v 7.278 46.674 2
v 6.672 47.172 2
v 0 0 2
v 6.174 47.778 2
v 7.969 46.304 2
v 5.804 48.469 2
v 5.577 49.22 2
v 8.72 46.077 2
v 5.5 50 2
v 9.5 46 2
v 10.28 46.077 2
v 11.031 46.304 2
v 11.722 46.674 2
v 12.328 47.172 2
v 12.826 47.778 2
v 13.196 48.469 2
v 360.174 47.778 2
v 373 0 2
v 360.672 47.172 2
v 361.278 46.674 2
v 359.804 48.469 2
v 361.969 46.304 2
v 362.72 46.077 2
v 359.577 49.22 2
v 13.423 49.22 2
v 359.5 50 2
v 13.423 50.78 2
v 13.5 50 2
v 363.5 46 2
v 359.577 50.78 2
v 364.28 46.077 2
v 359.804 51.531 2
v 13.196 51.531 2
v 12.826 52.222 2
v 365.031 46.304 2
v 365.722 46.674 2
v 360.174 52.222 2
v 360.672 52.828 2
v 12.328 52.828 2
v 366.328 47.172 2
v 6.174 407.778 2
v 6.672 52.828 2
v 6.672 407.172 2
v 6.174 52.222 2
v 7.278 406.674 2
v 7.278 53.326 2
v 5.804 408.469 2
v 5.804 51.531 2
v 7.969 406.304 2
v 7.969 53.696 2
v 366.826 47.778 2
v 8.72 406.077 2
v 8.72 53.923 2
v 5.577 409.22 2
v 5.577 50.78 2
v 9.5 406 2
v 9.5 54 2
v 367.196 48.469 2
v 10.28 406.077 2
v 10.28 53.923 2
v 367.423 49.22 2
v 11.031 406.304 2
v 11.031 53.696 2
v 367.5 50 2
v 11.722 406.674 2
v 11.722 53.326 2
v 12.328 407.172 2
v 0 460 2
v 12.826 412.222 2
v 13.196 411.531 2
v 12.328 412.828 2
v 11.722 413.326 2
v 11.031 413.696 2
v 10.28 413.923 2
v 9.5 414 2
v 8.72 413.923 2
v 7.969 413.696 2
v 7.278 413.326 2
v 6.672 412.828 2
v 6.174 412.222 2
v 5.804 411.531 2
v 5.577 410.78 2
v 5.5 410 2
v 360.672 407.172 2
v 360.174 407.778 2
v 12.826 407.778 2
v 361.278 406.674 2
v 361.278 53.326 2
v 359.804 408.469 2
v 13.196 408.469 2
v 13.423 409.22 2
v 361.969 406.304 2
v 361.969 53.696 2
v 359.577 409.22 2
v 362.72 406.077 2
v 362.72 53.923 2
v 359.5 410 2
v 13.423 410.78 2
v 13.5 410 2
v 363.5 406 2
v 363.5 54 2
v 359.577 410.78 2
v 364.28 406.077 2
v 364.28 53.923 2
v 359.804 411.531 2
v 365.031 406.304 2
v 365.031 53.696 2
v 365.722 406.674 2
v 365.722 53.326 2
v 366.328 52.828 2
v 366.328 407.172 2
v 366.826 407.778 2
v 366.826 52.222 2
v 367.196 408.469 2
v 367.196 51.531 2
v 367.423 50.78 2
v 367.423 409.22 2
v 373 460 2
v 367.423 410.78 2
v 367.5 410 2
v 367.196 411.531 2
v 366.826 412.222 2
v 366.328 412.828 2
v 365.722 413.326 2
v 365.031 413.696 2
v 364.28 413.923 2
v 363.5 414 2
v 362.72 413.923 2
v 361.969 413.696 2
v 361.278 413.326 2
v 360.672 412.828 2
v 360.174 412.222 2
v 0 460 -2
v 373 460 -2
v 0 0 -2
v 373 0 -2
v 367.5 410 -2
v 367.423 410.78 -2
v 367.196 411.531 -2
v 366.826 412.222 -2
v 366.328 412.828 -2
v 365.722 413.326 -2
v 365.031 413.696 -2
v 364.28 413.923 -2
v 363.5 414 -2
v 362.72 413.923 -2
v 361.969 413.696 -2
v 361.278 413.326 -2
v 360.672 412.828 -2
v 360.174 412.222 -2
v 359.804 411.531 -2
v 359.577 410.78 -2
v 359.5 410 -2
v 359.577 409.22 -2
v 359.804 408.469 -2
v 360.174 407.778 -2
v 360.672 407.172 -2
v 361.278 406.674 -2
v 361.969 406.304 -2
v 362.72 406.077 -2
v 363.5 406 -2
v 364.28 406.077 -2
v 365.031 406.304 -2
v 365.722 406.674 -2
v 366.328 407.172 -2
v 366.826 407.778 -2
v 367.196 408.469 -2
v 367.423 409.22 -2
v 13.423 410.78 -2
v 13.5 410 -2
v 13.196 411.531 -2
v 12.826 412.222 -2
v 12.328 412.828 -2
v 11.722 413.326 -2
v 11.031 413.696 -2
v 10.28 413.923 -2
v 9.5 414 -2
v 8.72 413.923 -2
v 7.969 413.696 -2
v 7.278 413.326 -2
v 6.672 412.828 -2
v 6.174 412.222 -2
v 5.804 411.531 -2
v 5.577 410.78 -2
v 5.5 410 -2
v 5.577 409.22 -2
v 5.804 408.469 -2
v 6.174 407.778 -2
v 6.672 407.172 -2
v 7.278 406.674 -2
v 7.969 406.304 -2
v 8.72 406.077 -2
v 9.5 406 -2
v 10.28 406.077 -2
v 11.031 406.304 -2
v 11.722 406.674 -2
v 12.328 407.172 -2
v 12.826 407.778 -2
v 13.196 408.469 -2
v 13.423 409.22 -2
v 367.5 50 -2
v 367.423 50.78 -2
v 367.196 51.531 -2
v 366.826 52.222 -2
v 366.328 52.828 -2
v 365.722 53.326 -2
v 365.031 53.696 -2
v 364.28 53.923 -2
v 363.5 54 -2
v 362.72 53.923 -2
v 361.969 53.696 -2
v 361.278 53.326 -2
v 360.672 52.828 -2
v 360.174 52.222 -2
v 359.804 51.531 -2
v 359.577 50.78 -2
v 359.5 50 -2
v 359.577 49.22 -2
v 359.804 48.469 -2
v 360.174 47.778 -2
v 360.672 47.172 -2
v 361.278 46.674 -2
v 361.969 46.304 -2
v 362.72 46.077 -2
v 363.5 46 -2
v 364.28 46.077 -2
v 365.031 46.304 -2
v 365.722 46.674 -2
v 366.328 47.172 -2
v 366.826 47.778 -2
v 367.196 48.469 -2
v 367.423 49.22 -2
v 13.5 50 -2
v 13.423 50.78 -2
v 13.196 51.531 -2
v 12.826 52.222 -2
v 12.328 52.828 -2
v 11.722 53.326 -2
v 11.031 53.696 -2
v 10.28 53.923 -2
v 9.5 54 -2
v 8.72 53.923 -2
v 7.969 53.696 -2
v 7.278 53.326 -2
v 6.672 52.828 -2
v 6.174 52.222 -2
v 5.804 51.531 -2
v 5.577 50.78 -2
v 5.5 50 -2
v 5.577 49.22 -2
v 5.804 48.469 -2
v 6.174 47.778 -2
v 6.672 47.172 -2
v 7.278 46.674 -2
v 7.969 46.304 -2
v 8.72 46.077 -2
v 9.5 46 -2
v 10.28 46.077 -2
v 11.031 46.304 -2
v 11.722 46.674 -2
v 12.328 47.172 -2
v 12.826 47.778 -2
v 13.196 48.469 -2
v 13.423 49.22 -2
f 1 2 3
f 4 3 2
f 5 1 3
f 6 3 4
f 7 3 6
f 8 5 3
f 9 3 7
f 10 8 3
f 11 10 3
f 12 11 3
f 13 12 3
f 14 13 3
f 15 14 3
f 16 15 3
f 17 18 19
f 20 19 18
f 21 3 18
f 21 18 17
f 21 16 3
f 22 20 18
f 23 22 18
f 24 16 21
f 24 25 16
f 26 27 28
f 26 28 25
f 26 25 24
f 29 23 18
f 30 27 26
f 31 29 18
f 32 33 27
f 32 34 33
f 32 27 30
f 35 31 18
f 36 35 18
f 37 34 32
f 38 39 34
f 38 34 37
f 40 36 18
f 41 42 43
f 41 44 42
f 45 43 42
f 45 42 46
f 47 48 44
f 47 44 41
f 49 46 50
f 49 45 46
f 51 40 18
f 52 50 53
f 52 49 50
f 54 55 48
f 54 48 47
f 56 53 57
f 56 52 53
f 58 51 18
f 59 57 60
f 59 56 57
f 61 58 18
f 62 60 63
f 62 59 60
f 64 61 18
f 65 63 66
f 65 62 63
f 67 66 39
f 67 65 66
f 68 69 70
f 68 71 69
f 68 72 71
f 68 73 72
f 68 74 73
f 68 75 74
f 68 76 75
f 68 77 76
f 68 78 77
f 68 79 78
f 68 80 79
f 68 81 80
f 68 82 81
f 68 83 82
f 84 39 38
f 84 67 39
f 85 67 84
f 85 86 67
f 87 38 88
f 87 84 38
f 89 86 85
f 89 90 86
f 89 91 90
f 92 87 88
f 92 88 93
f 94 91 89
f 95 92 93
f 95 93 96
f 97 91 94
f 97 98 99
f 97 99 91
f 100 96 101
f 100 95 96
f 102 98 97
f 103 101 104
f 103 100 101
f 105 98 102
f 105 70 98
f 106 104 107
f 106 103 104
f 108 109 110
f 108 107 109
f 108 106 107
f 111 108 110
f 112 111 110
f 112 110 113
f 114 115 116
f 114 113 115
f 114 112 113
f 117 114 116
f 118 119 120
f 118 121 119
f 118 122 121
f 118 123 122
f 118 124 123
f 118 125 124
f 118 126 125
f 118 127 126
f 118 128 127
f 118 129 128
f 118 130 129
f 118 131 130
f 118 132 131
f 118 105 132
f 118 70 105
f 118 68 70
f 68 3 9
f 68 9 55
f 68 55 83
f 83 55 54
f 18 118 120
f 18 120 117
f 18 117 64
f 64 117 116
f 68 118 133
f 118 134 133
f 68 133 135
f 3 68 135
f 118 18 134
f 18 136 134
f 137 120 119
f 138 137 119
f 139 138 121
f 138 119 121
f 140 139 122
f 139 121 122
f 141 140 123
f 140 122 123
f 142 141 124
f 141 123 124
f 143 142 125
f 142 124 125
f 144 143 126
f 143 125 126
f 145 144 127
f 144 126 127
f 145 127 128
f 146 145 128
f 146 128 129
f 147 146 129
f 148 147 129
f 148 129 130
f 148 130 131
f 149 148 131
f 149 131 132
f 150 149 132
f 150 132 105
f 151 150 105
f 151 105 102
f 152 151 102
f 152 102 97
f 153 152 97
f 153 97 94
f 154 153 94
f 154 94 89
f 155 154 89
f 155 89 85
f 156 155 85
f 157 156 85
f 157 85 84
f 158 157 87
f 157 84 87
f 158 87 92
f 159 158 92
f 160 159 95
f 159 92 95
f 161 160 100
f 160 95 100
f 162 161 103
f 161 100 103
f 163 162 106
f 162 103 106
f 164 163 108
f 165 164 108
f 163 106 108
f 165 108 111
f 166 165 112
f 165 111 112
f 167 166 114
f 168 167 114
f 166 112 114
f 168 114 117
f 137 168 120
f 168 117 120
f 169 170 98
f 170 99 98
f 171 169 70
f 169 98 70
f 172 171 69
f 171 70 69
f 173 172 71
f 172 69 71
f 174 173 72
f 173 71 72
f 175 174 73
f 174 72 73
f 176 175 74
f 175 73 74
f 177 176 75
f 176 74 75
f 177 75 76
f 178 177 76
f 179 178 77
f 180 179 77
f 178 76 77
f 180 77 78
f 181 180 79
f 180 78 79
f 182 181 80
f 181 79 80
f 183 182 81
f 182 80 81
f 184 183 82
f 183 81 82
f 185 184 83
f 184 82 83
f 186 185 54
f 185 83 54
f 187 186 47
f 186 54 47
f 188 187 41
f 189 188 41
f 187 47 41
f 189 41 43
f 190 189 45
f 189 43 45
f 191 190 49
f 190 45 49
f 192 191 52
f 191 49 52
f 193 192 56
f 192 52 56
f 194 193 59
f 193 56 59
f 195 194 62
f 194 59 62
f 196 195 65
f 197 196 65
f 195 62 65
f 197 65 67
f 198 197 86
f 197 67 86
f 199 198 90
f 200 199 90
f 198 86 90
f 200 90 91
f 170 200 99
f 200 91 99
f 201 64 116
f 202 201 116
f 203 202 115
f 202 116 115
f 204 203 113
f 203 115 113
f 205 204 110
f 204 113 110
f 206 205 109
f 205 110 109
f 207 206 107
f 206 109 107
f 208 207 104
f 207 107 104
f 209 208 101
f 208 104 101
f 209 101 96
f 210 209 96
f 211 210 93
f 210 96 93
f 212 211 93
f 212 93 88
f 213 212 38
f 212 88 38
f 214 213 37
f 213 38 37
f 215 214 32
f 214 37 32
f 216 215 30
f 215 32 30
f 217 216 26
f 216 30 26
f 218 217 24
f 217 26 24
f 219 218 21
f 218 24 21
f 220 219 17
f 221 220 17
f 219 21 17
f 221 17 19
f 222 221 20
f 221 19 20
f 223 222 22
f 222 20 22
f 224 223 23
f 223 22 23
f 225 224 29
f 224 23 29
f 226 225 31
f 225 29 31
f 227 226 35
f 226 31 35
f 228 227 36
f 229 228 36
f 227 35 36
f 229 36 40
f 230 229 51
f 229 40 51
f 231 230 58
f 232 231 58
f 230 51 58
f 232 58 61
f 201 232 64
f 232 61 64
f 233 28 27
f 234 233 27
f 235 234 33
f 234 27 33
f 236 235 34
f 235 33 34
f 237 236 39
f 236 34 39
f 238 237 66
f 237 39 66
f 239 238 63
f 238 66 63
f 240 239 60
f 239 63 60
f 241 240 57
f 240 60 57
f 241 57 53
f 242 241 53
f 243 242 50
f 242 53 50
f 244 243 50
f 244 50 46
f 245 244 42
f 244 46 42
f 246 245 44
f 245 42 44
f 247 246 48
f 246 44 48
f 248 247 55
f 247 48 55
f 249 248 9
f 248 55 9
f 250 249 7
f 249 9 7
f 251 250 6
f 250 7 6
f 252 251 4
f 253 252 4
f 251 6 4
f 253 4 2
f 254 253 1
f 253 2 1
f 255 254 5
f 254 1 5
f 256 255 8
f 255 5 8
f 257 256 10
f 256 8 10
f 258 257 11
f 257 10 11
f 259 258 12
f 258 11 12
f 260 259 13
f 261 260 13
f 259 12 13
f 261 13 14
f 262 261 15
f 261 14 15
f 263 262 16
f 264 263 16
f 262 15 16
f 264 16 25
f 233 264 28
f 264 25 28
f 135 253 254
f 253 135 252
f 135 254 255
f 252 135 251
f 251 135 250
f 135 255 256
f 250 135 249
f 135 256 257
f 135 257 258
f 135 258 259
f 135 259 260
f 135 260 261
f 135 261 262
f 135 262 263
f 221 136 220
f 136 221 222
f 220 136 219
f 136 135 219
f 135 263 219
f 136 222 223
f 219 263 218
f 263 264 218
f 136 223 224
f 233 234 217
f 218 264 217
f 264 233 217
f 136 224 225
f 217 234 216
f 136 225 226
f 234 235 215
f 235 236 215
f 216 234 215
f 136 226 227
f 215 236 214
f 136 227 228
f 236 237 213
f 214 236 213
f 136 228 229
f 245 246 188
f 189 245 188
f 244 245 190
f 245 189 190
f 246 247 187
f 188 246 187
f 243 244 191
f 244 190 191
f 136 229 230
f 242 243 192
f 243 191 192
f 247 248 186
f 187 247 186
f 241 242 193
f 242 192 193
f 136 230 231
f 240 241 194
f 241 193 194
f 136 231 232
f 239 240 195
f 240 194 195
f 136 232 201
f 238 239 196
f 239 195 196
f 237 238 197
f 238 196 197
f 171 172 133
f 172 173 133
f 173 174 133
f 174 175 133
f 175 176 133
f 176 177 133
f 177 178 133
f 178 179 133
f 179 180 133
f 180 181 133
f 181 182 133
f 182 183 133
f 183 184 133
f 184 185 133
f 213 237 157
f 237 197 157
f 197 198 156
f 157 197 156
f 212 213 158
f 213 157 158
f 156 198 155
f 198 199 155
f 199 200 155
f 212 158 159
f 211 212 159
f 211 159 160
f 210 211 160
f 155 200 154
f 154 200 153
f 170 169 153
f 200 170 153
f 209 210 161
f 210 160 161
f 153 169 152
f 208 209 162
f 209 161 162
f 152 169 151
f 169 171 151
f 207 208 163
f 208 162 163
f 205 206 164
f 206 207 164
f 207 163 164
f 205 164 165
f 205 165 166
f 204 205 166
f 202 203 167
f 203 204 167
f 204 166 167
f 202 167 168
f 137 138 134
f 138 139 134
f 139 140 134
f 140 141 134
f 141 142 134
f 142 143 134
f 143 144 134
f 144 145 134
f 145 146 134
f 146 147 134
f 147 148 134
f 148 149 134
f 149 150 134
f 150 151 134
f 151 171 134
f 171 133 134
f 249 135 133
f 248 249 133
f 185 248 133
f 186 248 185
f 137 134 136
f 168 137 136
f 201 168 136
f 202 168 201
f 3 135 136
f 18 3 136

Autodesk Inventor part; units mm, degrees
ref_plane "YZ Plane" through (0, 0, 0) normal (1, 0, 0) x (0, 1, 0)
ref_plane "XZ Plane" through (0, 0, 0) normal (0, 1, 0) x (-1, 0, 0)
ref_plane "XY Plane" through (0, 0, 0) normal (0, 0, 1) x (1, 0, 0)
sketch "Sketch1" plane through (0, 0, 0) normal (0, 0, 1) x (1, 0, 0)
  line L0 (0, 0) -> (373, 0)
  line L1 (373, 0) -> (373, 460)
  line L2 (373, 460) -> (0, 460)
  line L3 (0, 460) -> (0, 0)
  dimension "d0" = 373
  dimension "d1" = 460
extrude "Extrusion1" add sketch "Sketch1" along normal mid plane 4
sketch "Sketch2" plane through (0, 0, 2) normal (0, 0, 1) x (1, 0, 0)
  circle A0 centre (9.5, 410) radius 4
  circle A1 centre (363.5, 410) radius 4
  circle A2 centre (9.5, 50) radius 4
  circle A3 centre (363.5, 50) radius 4
  line L0 (373, 460) -> (0, 460) projected
  line L1 (373, 0) -> (373, 460) projected
  line L2 (0, 460) -> (0, 0) projected
  line L3 (0, 0) -> (373, 0) projected
  dimension "d4" = 8
  dimension "d5" = 8
  dimension "d6" = 8
  dimension "d7" = 8
  dimension "d8" = 50
  dimension "d9" = 9.5
  dimension "d10" = 50
  dimension "d11" = 9.5
  dimension "d12" = 50
  dimension "d13" = 9.5
  dimension "d14" = 50
  dimension "d15" = 9.5
extrude "Extrusion2" cut sketch "Sketch2" against normal blind 4 contours A0 | A1 | A2 | A3
properties part number "perspex height" material "Glass"
